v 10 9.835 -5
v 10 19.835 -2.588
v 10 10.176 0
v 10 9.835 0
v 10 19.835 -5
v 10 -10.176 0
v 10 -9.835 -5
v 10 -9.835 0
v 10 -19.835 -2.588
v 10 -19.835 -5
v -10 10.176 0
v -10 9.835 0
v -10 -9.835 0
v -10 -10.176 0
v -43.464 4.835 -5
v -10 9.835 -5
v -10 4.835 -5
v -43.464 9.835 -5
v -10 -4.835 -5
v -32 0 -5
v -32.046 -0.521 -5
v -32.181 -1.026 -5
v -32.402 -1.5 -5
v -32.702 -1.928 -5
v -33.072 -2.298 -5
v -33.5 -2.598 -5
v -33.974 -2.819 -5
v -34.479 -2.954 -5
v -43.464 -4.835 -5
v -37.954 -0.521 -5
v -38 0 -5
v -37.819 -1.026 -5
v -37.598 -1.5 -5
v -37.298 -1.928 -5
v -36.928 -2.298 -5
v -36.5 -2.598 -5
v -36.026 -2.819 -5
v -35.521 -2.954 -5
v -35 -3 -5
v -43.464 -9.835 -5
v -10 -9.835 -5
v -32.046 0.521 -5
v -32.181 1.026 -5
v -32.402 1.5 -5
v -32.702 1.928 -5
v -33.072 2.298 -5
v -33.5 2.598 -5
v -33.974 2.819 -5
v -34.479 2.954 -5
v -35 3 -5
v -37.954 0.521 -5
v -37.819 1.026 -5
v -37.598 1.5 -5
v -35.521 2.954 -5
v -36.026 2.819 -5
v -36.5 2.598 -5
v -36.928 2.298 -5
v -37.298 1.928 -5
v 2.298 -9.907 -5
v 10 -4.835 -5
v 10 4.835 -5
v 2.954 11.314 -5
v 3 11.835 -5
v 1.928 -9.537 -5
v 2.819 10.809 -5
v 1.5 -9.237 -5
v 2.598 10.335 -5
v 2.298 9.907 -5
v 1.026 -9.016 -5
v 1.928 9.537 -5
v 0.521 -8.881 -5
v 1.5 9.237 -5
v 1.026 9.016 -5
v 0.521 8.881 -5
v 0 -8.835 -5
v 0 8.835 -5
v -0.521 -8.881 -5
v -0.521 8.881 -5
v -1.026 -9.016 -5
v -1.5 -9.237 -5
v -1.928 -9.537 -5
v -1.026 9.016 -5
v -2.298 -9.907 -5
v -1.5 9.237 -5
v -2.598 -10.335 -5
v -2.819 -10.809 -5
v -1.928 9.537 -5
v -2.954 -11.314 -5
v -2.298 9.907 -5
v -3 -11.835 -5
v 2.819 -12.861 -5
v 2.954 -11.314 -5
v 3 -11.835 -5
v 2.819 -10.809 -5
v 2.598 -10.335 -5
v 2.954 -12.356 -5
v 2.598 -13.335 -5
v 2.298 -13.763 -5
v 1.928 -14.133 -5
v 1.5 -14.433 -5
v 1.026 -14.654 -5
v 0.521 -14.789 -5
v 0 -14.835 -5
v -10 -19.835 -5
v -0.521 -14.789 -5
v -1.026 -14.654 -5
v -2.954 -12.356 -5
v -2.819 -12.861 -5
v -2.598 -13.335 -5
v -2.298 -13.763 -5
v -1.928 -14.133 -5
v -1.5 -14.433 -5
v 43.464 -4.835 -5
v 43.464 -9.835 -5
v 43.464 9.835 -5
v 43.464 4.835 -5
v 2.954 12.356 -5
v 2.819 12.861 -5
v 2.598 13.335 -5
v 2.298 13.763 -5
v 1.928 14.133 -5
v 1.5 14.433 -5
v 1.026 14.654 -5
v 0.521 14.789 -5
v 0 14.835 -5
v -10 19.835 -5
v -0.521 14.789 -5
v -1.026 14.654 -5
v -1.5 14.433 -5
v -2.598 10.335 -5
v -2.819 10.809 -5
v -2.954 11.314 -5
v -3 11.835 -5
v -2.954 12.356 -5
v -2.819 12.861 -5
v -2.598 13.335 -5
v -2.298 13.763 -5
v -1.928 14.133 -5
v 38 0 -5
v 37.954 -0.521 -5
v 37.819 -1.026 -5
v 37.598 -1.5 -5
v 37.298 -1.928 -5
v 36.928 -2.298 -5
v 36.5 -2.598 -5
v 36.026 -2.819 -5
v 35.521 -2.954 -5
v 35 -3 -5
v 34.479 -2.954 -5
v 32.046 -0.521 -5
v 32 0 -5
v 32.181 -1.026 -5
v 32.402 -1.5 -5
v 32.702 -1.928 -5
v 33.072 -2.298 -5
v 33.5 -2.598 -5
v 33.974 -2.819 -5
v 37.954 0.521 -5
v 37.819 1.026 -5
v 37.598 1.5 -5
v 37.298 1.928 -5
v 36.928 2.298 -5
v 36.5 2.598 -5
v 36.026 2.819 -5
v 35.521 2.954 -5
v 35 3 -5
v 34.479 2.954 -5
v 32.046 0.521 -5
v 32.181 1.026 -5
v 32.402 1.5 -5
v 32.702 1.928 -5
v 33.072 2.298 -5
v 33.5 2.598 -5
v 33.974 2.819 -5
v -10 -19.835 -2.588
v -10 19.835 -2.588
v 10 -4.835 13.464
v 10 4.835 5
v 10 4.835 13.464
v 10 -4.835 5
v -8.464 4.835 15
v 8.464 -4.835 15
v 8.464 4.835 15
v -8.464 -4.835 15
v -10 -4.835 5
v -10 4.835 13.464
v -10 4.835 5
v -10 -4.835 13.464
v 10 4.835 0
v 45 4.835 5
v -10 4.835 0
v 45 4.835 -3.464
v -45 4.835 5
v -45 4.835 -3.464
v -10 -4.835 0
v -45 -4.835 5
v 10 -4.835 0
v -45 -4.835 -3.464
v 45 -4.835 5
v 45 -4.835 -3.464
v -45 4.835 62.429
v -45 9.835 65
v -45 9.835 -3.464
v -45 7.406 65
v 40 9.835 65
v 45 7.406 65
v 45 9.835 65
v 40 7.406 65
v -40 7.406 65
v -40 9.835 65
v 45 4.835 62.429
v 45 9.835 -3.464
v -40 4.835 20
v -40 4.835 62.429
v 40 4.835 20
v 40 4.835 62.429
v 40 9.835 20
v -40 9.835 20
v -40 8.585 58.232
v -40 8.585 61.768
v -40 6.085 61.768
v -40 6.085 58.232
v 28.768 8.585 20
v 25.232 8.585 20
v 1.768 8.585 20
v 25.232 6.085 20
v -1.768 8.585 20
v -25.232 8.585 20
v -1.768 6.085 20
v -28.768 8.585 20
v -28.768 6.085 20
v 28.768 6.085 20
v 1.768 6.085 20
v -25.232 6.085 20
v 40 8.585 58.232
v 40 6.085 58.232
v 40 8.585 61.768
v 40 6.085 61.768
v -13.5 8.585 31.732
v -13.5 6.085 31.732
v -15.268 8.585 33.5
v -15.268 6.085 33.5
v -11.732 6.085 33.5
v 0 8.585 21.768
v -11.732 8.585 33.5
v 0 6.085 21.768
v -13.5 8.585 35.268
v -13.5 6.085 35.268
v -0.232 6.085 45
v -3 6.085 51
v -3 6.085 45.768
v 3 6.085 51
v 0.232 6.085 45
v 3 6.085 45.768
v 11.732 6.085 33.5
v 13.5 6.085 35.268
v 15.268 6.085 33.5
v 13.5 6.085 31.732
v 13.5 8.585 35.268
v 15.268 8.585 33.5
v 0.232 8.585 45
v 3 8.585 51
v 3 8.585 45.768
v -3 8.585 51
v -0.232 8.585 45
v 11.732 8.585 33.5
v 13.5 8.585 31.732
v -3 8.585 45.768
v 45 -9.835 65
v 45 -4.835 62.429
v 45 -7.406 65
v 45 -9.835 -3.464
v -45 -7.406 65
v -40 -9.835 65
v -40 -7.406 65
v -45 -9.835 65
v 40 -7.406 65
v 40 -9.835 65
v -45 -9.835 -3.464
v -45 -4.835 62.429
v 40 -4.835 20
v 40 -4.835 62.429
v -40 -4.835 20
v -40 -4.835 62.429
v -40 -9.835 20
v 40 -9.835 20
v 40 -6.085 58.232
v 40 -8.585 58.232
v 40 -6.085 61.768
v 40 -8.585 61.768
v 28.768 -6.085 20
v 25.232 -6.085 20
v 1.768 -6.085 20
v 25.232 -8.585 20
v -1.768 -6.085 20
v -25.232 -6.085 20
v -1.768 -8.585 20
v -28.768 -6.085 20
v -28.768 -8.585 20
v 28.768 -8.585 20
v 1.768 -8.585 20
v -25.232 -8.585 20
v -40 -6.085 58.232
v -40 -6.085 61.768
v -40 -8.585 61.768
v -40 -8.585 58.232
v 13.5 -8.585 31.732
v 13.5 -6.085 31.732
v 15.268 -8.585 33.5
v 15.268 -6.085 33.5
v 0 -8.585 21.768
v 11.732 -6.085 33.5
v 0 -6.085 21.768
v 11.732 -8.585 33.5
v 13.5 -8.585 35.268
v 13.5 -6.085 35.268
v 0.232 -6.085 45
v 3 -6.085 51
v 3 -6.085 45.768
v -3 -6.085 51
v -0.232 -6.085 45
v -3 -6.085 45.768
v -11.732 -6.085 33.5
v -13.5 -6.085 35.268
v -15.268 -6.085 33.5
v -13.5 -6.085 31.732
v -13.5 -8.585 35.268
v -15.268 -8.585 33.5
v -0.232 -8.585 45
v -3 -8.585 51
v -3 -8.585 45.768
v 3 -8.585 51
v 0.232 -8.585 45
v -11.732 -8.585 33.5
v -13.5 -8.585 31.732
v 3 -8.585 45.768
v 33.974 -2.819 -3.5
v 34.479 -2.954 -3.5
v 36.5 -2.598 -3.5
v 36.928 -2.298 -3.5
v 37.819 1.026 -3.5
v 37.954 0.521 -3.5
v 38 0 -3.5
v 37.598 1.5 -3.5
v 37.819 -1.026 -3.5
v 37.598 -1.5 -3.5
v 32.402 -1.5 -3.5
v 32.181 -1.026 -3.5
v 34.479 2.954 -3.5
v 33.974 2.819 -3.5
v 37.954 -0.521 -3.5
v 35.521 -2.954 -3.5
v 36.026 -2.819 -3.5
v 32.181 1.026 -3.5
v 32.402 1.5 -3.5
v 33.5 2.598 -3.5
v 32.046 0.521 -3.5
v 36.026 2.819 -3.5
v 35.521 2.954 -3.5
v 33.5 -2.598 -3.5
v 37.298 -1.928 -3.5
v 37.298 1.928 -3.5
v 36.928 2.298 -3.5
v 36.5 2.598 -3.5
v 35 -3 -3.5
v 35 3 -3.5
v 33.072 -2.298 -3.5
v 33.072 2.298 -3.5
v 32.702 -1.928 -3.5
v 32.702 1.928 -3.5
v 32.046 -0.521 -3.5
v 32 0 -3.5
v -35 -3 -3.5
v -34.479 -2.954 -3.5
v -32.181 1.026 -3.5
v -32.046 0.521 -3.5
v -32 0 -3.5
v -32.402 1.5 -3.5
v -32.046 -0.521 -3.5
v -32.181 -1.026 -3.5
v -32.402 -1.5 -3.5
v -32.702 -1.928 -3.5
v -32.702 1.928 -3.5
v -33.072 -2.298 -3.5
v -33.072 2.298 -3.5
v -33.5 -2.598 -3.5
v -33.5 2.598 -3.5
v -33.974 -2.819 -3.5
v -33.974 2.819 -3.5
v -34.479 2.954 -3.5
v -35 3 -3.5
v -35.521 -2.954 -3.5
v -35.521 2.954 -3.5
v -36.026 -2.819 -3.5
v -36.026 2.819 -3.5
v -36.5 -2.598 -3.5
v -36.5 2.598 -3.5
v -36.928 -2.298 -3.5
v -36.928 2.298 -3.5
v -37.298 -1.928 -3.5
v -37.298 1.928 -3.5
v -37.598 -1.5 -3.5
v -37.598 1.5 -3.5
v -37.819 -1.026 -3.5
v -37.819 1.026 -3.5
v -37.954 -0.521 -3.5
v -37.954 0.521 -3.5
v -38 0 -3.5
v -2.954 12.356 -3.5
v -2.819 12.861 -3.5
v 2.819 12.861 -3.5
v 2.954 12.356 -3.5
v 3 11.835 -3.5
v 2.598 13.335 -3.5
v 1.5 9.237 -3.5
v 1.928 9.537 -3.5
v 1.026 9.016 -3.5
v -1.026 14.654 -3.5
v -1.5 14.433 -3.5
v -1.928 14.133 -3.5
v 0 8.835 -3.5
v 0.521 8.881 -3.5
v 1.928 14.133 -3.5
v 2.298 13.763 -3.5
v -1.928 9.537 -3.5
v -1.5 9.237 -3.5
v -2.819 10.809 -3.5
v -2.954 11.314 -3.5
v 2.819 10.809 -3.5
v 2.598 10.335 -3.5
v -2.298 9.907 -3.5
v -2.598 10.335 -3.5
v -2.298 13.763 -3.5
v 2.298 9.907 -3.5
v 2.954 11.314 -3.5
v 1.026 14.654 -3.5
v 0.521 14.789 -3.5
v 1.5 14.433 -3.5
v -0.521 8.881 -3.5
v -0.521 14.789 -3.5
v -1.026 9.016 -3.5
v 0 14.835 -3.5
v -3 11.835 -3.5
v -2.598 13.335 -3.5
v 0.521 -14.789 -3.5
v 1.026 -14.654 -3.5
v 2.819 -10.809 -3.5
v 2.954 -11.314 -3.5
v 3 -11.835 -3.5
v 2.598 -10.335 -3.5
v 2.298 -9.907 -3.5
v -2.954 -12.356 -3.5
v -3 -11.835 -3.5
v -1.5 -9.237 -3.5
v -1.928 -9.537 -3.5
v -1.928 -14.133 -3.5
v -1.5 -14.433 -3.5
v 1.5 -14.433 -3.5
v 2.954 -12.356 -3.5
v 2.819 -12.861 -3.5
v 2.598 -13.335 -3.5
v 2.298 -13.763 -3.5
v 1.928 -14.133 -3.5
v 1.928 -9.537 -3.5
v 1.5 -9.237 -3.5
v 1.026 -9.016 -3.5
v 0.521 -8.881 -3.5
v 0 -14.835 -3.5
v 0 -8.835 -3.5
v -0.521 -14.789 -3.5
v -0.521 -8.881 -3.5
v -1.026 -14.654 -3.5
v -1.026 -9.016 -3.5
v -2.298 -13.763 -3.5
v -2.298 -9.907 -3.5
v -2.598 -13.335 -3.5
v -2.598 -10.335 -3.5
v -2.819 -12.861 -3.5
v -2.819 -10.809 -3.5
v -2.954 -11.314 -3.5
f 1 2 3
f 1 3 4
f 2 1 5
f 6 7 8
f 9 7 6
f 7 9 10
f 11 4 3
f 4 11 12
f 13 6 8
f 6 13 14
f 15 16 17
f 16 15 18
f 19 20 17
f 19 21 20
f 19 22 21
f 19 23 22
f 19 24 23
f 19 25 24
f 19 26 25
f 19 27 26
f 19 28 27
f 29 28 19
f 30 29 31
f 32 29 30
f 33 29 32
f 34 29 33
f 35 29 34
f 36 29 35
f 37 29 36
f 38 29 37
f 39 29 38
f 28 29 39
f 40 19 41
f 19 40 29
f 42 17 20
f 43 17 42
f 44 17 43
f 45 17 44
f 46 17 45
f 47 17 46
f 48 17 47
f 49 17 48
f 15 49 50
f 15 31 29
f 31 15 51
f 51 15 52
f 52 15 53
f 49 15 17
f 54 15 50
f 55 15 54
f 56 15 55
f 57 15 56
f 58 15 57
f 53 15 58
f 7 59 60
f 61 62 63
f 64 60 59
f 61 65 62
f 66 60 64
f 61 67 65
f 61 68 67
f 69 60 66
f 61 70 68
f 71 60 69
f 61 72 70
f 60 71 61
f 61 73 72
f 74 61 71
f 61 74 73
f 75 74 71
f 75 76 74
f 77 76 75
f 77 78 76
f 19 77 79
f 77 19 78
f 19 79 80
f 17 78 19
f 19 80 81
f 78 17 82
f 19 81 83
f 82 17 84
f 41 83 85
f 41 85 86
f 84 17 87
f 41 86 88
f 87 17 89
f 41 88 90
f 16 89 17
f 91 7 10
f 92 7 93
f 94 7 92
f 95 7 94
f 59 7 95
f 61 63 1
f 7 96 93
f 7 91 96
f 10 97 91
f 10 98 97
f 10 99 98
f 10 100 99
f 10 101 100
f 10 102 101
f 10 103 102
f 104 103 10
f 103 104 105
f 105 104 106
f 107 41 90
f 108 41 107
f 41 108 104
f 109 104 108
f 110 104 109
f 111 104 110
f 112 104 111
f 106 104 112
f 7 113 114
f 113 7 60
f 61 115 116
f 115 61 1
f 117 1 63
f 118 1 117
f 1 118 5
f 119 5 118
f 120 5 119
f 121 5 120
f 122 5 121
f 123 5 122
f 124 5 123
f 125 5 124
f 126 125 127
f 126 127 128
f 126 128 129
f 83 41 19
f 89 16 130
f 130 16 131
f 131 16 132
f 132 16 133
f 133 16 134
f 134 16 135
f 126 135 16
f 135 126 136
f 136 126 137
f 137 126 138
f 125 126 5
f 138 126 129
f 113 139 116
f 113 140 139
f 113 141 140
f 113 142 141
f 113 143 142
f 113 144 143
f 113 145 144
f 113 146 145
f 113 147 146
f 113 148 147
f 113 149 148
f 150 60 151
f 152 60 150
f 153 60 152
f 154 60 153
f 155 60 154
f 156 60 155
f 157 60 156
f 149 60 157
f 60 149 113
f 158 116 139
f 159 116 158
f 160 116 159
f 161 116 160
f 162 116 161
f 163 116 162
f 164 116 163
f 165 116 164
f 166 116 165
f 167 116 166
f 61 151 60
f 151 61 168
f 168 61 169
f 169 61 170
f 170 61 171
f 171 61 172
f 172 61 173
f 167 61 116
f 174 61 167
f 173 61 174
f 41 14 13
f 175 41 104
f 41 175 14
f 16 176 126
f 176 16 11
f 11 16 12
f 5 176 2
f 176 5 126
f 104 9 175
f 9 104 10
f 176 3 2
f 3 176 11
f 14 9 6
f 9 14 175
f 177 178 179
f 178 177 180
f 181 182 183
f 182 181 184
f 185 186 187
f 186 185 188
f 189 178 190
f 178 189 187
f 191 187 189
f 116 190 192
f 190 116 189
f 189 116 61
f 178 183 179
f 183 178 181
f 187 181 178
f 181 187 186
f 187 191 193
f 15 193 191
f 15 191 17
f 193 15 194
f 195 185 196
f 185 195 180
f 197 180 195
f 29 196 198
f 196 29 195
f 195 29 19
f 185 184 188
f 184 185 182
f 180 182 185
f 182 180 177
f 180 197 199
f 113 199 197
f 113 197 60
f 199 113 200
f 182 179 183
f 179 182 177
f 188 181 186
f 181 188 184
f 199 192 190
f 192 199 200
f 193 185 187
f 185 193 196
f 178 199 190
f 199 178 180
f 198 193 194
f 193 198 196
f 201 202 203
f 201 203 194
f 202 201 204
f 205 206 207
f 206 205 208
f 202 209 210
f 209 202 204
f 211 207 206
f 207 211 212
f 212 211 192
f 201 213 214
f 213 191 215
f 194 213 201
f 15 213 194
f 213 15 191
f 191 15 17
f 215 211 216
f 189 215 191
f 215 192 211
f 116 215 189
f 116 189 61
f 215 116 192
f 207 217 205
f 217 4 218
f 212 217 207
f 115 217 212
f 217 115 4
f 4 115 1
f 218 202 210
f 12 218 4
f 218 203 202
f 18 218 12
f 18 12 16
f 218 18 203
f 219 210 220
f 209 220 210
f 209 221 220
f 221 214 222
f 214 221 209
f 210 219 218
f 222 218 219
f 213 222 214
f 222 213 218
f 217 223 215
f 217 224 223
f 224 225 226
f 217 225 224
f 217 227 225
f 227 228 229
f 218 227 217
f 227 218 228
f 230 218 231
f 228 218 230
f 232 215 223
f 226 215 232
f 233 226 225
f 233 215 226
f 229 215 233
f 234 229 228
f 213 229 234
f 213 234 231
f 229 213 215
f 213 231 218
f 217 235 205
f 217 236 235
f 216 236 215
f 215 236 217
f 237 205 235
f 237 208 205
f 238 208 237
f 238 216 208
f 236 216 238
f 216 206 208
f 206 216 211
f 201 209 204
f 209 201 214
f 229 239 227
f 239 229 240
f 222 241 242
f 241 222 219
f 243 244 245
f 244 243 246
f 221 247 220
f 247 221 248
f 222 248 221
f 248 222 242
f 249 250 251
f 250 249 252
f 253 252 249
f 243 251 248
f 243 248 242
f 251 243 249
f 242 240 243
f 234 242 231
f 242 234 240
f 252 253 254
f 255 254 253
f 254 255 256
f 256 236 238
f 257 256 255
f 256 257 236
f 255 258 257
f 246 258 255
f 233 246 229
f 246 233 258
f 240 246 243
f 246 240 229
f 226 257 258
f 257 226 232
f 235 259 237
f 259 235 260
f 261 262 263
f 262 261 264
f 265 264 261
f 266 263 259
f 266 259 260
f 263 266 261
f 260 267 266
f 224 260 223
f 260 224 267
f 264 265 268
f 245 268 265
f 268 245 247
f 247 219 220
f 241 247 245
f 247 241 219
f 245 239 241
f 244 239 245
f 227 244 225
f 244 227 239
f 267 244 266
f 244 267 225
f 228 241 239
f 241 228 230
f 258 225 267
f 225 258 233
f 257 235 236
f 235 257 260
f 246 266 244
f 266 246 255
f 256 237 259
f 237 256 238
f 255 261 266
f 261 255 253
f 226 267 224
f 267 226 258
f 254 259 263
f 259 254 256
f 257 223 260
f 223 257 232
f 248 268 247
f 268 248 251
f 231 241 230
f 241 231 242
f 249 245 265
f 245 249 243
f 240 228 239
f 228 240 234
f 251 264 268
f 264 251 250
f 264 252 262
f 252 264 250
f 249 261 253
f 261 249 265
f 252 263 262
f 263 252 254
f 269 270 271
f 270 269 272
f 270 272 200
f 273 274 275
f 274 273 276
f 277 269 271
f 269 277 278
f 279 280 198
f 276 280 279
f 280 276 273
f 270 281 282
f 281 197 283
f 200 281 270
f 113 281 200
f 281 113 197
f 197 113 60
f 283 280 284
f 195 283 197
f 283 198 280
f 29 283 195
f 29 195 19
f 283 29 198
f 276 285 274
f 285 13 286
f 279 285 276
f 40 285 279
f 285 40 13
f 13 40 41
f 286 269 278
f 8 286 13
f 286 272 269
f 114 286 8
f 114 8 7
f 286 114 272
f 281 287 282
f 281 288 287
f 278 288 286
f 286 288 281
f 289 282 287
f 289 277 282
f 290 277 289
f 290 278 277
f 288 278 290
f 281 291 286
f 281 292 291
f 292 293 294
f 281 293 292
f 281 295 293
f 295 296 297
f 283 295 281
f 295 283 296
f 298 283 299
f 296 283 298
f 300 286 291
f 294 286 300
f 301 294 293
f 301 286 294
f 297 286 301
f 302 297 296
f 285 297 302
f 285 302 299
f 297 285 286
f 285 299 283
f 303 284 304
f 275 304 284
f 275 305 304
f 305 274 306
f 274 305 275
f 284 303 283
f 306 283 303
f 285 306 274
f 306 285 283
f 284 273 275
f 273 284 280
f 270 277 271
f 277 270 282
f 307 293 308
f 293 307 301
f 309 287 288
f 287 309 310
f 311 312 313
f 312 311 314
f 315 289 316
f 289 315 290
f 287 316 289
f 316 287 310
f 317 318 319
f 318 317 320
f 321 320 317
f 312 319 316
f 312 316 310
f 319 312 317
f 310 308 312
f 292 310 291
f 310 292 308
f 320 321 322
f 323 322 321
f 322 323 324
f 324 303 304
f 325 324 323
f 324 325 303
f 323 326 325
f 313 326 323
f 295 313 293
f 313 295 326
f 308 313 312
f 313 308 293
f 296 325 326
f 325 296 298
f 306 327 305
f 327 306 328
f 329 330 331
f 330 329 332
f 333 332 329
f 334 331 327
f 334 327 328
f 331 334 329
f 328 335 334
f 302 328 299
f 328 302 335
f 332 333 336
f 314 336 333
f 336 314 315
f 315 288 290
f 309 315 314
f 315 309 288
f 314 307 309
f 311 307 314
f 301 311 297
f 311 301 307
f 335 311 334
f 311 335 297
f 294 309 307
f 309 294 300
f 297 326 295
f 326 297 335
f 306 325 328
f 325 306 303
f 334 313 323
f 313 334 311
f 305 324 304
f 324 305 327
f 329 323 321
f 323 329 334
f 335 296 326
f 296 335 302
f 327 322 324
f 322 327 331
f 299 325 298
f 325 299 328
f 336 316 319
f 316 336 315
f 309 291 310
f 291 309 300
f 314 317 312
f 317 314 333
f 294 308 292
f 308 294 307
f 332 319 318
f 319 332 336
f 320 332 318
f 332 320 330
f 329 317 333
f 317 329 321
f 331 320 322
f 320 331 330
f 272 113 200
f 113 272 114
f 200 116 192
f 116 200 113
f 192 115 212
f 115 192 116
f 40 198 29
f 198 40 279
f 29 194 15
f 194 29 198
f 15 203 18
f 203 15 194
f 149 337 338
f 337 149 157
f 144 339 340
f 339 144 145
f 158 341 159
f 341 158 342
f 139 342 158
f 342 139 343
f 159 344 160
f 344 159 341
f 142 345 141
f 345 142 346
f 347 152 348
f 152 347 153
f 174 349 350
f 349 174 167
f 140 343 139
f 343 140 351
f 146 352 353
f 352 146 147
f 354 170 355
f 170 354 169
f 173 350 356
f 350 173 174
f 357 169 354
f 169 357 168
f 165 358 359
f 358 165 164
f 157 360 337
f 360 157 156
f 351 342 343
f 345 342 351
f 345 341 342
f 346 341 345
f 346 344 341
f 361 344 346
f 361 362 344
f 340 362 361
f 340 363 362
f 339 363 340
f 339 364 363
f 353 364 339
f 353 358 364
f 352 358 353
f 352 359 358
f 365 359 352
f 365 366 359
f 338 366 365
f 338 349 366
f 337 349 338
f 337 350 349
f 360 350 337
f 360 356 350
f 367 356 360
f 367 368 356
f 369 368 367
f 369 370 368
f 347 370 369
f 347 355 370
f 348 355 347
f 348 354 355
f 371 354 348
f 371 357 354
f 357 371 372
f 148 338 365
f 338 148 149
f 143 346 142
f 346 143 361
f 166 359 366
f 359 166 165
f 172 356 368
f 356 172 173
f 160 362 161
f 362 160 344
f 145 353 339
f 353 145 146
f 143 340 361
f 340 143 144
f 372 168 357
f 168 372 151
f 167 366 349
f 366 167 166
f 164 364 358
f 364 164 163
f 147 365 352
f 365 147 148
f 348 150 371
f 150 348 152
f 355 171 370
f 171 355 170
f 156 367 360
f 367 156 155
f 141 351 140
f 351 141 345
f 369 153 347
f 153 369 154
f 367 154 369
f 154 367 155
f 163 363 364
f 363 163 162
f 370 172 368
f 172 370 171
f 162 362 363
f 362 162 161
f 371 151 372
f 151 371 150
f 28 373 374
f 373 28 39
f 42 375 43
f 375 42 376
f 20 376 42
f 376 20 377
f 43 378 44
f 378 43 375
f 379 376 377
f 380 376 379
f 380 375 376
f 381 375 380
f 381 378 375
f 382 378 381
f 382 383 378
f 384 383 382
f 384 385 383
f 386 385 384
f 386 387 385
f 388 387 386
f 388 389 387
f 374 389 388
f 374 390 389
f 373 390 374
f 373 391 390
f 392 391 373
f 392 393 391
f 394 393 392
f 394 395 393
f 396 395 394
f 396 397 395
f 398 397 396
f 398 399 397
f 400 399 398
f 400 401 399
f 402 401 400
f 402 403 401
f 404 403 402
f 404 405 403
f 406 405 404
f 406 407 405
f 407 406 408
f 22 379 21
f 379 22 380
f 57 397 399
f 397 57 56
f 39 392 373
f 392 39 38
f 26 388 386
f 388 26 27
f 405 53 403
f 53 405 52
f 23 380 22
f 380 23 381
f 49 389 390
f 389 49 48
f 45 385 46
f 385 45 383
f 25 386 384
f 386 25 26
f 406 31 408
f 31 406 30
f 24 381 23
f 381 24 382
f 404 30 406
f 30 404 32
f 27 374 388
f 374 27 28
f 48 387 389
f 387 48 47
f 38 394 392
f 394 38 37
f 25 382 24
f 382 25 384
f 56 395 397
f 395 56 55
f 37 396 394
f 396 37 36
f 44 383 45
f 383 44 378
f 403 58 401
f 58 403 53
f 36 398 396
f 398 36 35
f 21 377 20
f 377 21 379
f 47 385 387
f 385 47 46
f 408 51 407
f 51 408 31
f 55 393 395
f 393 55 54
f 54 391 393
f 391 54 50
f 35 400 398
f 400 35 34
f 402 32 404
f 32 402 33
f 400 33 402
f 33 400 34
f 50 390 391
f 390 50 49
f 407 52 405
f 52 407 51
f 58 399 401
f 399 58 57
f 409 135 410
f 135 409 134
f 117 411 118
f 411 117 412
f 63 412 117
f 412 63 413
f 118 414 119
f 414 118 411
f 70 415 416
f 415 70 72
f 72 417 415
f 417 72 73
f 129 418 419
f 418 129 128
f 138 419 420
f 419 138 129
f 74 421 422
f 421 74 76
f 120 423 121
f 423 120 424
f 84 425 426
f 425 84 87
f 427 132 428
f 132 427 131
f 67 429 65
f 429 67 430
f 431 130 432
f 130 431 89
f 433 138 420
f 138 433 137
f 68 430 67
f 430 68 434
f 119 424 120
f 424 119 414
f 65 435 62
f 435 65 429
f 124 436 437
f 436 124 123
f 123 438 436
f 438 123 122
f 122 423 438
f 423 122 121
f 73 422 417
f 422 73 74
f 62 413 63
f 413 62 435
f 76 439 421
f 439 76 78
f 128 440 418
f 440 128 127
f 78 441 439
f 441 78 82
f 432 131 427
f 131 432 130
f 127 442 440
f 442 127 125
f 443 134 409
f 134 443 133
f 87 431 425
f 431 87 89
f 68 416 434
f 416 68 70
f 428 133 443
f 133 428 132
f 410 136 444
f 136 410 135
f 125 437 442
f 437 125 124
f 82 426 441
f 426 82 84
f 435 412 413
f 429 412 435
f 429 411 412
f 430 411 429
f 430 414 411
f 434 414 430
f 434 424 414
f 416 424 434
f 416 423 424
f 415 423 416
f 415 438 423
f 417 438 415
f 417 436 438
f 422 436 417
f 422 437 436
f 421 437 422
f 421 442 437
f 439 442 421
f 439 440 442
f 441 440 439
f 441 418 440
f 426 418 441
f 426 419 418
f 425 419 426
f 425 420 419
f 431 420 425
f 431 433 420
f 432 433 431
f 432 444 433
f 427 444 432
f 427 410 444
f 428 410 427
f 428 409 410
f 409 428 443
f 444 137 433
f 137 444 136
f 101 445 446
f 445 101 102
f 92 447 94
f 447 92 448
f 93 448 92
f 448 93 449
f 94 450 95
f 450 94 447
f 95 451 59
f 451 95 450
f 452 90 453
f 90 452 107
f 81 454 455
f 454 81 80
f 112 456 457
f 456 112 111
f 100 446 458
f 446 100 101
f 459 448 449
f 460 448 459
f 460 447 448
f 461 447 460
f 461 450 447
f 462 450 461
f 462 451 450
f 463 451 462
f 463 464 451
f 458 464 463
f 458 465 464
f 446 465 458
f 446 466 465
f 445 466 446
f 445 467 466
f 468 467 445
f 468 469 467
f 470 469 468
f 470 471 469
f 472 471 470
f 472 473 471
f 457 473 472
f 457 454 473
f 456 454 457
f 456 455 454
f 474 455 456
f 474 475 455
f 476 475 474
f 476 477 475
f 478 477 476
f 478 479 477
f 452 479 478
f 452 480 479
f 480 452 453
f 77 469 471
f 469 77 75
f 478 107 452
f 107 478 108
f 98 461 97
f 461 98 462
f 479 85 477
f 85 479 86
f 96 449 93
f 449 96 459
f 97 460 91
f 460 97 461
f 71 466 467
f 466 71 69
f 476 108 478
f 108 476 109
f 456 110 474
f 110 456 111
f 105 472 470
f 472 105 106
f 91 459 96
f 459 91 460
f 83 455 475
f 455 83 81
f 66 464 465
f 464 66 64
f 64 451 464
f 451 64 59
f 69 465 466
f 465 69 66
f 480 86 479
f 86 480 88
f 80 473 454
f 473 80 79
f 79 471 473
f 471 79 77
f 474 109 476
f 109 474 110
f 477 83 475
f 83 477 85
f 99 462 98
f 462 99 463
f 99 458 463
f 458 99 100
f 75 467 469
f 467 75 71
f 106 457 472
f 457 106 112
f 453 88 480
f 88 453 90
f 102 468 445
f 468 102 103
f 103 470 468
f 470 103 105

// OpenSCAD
NumberOfBoards = 6; //[3:9]

/* [Magnet Size] */
MagnetWidth = 6; //diameter of the magnet in mm
MagnetHeight = 1.5; //height of the magnet in mm

/* [Hidden] */
holeRad = MagnetWidth;
zSize = MagnetHeight;
gapSize = .25 + NumberOfBoards*1.57; //number of boards times the height of each board

module base() {
    union() {
        cube([90, gapSize, 10], center = true);//big base
        difference() {
            translate([0, 0, -2.5]) cube([20, 30 + gapSize, 5], center = true);//side thing
            translate([0, 15 + gapSize/2, 0]) rotate([75, 0, 0]) cube([25, 5, 25], center = true);//cut the sides off
            translate([0, -15 -gapSize/2, 0]) rotate([-75, 0, 0]) cube([25, 5, 25], center = true);//cut the sides off
        }
        difference() {
            translate([0, 0, 5]) cube([20, gapSize, 20], center = true);//middle hump
            translate([10, 0, 17]) rotate([0, 45, 0]) cube([5, gapSize + 1, 5], center = true);//minus a corner
            translate([-10, 0, 17]) rotate([0, 45, 0]) cube([5, gapSize + 1, 5], center = true);//minus another corner
        }
    }
}
module holes() {
    cylinder(r = holeRad/2, h = zSize*2, $fn = 36, center = true);
}
module sides() {
    union() {
        difference() {
            cube([90, 5, 70], center = true);//main wall
            translate ([0, 0, 25]) cube([80, 20, 70], center = true);//minus the big hole in middle
            translate([0, 7, 35]) rotate([45, 0, 0]) cube([95, 10, 10], center = true);//minus the rounded top
            }
            translate([10, 0, 0]) rotate([0, 45, 0]) cube([2.5, 2.5, 90], center = true);//plus cross bar 1
            translate([-10, 0, 0]) rotate([0, -45, 0]) cube([2.5, 2.5, 90], center = true);//plus cross bar 2
            translate([-17, 0, 0]) rotate([0, 45, 0]) cube([2.5, 2.5, 50], center = true);//plus crossbar 3
            translate([17, 0, 0]) rotate([0, -45, 0]) cube([2.5, 2.5, 50], center = true);//plus crossbar 4
            translate([0, 0, 18]) cube([6, 2.5, 6], center = true);//plus middle cube
    }
}
module megaBase() {
    union() {
        base();
        translate([0, 2.5 +  gapSize/2, 30]) rotate([0, 0, 180]) sides();//put on the sides
        translate([0, -2.5 -gapSize/2, 30]) sides();//put on the sides
    }
}
difference() {
    megaBase();
    translate([47, 0, -5]) rotate([0, 45, 0]) cube([5, gapSize + 20, 5], center = true);//cut off corners
    translate([-47, 0, -5]) rotate([0, 45, 0]) cube([5, gapSize + 20, 5], center = true);//cut off corners
    translate ([35, 0, -5]) holes();//let's cut some holes out
    translate ([-35, 0, -5]) holes();//let's cut some holes out
    translate ([0, 7 + gapSize/2, -5]) holes();//let's cut some holes out
    translate ([0, -7 - gapSize/2, -5]) holes();//let's cut some holes out
}
